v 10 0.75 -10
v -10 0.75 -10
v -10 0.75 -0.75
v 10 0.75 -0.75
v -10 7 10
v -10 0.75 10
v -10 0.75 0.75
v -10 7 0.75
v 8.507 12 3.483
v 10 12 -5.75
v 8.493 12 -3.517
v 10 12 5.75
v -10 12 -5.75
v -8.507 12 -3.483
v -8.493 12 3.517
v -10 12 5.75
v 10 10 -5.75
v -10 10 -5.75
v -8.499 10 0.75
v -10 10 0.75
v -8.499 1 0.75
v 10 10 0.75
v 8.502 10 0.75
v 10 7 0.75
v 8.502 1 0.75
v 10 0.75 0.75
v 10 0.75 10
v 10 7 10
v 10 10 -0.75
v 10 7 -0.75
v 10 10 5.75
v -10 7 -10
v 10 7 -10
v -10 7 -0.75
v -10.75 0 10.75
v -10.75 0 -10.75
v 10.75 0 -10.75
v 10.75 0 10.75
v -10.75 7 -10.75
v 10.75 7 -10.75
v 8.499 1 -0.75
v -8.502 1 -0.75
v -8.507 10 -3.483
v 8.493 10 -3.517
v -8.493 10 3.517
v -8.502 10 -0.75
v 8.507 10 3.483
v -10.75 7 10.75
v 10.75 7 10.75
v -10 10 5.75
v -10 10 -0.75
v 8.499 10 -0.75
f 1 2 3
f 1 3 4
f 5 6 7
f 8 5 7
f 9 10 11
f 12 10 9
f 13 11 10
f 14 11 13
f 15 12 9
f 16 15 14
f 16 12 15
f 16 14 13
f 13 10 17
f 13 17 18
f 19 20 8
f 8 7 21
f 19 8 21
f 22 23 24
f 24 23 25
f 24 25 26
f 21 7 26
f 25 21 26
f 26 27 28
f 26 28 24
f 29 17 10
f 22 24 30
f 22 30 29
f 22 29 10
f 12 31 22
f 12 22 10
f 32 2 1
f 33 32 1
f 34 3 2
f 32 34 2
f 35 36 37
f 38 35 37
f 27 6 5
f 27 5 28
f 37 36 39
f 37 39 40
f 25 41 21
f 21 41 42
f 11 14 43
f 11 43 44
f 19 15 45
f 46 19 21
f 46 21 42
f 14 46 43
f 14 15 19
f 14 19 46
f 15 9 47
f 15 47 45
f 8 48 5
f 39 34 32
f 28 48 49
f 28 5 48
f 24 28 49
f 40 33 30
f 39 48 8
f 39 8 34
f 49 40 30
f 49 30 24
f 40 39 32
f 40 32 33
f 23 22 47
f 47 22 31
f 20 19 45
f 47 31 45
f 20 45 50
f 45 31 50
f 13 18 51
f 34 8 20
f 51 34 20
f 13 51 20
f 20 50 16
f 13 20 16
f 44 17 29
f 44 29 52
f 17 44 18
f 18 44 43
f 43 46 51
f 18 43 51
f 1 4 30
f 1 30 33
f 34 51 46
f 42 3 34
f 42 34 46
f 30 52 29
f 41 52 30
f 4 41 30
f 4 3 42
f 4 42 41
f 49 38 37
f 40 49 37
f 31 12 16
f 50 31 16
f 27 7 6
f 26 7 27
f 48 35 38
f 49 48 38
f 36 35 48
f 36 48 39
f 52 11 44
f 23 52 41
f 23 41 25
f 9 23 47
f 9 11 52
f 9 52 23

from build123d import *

# Parameters (mm, degrees)
SKETCH1_W                = 21.5
SKETCH1_H                = 21.5
BOSS_EXTRUDE1_DEPTH      = 7
SKETCH1_3_W              = 20
SKETCH1_3_H              = 20
BOSS_EXTRUDE2_DEPTH      = 0.75
SKETCH1_4_W              = 20
SKETCH1_4_H              = 1.5
BOSS_EXTRUDE3_DEPTH      = 12
BOSS_EXTRUDE4_DEPTH      = 5
BOSS_EXTRUDE4_DEPTH_BACK = 6.5
SKETCH3_W                = 20
SKETCH3_H                = 2
CUT_EXTRUDE1_DEPTH       = 11


with BuildPart() as part:
    # Sketch1 → Boss-Extrude1 (new body)
    with BuildSketch(Plane(origin=(0, 0, 0), x_dir=(1, 0, 0), z_dir=(0, 1, 0))):
        Rectangle(SKETCH1_W, SKETCH1_H)
        Polygon((-10, 0.75), (-10, 10), (10, 10), (10, 0.75), (10, -0.75), (10, -10), (-10, -10), (-10, -0.75), align=None, mode=Mode.SUBTRACT)
    extrude(amount=BOSS_EXTRUDE1_DEPTH)

    # Sketch1<3> → Boss-Extrude2 (add)
    with BuildSketch(Plane(origin=(0, 0, 0), x_dir=(1, 0, 0), z_dir=(0, 1, 0))):
        Rectangle(SKETCH1_3_W, SKETCH1_3_H)
    extrude(amount=BOSS_EXTRUDE2_DEPTH)

    # Sketch1<4> → Boss-Extrude3 (add)
    with BuildSketch(Plane(origin=(0, 0, 0), x_dir=(1, 0, 0), z_dir=(0, 1, 0))):
        Rectangle(SKETCH1_4_W, SKETCH1_4_H)
    extrude(amount=BOSS_EXTRUDE3_DEPTH)

    # Sketch3 → Boss-Extrude4 (add, two sides: drawn at the far end of the back side and taken through both)
    with BuildSketch(Plane(origin=(0, 0, -0.75), x_dir=(-1, 0, 0), z_dir=(0, 0, -1)).offset(-BOSS_EXTRUDE4_DEPTH_BACK)):
        with Locations((0, 11)):
            Rectangle(SKETCH3_W, SKETCH3_H)
    extrude(amount=BOSS_EXTRUDE4_DEPTH + BOSS_EXTRUDE4_DEPTH_BACK)

    # Sketch4 → Cut-Extrude1 (cut)
    with BuildSketch(Plane(origin=(0, 12, 0), x_dir=(1, 0, 0), z_dir=(0, 1, 0))):
        Polygon((-8.507158245, 3.482615691), (8.492841755, 3.517384309), (8.507158245, -3.482615691), (-8.492841755, -3.517384309), align=None)
    extrude(amount=-CUT_EXTRUDE1_DEPTH, mode=Mode.SUBTRACT)


solid = part.part
